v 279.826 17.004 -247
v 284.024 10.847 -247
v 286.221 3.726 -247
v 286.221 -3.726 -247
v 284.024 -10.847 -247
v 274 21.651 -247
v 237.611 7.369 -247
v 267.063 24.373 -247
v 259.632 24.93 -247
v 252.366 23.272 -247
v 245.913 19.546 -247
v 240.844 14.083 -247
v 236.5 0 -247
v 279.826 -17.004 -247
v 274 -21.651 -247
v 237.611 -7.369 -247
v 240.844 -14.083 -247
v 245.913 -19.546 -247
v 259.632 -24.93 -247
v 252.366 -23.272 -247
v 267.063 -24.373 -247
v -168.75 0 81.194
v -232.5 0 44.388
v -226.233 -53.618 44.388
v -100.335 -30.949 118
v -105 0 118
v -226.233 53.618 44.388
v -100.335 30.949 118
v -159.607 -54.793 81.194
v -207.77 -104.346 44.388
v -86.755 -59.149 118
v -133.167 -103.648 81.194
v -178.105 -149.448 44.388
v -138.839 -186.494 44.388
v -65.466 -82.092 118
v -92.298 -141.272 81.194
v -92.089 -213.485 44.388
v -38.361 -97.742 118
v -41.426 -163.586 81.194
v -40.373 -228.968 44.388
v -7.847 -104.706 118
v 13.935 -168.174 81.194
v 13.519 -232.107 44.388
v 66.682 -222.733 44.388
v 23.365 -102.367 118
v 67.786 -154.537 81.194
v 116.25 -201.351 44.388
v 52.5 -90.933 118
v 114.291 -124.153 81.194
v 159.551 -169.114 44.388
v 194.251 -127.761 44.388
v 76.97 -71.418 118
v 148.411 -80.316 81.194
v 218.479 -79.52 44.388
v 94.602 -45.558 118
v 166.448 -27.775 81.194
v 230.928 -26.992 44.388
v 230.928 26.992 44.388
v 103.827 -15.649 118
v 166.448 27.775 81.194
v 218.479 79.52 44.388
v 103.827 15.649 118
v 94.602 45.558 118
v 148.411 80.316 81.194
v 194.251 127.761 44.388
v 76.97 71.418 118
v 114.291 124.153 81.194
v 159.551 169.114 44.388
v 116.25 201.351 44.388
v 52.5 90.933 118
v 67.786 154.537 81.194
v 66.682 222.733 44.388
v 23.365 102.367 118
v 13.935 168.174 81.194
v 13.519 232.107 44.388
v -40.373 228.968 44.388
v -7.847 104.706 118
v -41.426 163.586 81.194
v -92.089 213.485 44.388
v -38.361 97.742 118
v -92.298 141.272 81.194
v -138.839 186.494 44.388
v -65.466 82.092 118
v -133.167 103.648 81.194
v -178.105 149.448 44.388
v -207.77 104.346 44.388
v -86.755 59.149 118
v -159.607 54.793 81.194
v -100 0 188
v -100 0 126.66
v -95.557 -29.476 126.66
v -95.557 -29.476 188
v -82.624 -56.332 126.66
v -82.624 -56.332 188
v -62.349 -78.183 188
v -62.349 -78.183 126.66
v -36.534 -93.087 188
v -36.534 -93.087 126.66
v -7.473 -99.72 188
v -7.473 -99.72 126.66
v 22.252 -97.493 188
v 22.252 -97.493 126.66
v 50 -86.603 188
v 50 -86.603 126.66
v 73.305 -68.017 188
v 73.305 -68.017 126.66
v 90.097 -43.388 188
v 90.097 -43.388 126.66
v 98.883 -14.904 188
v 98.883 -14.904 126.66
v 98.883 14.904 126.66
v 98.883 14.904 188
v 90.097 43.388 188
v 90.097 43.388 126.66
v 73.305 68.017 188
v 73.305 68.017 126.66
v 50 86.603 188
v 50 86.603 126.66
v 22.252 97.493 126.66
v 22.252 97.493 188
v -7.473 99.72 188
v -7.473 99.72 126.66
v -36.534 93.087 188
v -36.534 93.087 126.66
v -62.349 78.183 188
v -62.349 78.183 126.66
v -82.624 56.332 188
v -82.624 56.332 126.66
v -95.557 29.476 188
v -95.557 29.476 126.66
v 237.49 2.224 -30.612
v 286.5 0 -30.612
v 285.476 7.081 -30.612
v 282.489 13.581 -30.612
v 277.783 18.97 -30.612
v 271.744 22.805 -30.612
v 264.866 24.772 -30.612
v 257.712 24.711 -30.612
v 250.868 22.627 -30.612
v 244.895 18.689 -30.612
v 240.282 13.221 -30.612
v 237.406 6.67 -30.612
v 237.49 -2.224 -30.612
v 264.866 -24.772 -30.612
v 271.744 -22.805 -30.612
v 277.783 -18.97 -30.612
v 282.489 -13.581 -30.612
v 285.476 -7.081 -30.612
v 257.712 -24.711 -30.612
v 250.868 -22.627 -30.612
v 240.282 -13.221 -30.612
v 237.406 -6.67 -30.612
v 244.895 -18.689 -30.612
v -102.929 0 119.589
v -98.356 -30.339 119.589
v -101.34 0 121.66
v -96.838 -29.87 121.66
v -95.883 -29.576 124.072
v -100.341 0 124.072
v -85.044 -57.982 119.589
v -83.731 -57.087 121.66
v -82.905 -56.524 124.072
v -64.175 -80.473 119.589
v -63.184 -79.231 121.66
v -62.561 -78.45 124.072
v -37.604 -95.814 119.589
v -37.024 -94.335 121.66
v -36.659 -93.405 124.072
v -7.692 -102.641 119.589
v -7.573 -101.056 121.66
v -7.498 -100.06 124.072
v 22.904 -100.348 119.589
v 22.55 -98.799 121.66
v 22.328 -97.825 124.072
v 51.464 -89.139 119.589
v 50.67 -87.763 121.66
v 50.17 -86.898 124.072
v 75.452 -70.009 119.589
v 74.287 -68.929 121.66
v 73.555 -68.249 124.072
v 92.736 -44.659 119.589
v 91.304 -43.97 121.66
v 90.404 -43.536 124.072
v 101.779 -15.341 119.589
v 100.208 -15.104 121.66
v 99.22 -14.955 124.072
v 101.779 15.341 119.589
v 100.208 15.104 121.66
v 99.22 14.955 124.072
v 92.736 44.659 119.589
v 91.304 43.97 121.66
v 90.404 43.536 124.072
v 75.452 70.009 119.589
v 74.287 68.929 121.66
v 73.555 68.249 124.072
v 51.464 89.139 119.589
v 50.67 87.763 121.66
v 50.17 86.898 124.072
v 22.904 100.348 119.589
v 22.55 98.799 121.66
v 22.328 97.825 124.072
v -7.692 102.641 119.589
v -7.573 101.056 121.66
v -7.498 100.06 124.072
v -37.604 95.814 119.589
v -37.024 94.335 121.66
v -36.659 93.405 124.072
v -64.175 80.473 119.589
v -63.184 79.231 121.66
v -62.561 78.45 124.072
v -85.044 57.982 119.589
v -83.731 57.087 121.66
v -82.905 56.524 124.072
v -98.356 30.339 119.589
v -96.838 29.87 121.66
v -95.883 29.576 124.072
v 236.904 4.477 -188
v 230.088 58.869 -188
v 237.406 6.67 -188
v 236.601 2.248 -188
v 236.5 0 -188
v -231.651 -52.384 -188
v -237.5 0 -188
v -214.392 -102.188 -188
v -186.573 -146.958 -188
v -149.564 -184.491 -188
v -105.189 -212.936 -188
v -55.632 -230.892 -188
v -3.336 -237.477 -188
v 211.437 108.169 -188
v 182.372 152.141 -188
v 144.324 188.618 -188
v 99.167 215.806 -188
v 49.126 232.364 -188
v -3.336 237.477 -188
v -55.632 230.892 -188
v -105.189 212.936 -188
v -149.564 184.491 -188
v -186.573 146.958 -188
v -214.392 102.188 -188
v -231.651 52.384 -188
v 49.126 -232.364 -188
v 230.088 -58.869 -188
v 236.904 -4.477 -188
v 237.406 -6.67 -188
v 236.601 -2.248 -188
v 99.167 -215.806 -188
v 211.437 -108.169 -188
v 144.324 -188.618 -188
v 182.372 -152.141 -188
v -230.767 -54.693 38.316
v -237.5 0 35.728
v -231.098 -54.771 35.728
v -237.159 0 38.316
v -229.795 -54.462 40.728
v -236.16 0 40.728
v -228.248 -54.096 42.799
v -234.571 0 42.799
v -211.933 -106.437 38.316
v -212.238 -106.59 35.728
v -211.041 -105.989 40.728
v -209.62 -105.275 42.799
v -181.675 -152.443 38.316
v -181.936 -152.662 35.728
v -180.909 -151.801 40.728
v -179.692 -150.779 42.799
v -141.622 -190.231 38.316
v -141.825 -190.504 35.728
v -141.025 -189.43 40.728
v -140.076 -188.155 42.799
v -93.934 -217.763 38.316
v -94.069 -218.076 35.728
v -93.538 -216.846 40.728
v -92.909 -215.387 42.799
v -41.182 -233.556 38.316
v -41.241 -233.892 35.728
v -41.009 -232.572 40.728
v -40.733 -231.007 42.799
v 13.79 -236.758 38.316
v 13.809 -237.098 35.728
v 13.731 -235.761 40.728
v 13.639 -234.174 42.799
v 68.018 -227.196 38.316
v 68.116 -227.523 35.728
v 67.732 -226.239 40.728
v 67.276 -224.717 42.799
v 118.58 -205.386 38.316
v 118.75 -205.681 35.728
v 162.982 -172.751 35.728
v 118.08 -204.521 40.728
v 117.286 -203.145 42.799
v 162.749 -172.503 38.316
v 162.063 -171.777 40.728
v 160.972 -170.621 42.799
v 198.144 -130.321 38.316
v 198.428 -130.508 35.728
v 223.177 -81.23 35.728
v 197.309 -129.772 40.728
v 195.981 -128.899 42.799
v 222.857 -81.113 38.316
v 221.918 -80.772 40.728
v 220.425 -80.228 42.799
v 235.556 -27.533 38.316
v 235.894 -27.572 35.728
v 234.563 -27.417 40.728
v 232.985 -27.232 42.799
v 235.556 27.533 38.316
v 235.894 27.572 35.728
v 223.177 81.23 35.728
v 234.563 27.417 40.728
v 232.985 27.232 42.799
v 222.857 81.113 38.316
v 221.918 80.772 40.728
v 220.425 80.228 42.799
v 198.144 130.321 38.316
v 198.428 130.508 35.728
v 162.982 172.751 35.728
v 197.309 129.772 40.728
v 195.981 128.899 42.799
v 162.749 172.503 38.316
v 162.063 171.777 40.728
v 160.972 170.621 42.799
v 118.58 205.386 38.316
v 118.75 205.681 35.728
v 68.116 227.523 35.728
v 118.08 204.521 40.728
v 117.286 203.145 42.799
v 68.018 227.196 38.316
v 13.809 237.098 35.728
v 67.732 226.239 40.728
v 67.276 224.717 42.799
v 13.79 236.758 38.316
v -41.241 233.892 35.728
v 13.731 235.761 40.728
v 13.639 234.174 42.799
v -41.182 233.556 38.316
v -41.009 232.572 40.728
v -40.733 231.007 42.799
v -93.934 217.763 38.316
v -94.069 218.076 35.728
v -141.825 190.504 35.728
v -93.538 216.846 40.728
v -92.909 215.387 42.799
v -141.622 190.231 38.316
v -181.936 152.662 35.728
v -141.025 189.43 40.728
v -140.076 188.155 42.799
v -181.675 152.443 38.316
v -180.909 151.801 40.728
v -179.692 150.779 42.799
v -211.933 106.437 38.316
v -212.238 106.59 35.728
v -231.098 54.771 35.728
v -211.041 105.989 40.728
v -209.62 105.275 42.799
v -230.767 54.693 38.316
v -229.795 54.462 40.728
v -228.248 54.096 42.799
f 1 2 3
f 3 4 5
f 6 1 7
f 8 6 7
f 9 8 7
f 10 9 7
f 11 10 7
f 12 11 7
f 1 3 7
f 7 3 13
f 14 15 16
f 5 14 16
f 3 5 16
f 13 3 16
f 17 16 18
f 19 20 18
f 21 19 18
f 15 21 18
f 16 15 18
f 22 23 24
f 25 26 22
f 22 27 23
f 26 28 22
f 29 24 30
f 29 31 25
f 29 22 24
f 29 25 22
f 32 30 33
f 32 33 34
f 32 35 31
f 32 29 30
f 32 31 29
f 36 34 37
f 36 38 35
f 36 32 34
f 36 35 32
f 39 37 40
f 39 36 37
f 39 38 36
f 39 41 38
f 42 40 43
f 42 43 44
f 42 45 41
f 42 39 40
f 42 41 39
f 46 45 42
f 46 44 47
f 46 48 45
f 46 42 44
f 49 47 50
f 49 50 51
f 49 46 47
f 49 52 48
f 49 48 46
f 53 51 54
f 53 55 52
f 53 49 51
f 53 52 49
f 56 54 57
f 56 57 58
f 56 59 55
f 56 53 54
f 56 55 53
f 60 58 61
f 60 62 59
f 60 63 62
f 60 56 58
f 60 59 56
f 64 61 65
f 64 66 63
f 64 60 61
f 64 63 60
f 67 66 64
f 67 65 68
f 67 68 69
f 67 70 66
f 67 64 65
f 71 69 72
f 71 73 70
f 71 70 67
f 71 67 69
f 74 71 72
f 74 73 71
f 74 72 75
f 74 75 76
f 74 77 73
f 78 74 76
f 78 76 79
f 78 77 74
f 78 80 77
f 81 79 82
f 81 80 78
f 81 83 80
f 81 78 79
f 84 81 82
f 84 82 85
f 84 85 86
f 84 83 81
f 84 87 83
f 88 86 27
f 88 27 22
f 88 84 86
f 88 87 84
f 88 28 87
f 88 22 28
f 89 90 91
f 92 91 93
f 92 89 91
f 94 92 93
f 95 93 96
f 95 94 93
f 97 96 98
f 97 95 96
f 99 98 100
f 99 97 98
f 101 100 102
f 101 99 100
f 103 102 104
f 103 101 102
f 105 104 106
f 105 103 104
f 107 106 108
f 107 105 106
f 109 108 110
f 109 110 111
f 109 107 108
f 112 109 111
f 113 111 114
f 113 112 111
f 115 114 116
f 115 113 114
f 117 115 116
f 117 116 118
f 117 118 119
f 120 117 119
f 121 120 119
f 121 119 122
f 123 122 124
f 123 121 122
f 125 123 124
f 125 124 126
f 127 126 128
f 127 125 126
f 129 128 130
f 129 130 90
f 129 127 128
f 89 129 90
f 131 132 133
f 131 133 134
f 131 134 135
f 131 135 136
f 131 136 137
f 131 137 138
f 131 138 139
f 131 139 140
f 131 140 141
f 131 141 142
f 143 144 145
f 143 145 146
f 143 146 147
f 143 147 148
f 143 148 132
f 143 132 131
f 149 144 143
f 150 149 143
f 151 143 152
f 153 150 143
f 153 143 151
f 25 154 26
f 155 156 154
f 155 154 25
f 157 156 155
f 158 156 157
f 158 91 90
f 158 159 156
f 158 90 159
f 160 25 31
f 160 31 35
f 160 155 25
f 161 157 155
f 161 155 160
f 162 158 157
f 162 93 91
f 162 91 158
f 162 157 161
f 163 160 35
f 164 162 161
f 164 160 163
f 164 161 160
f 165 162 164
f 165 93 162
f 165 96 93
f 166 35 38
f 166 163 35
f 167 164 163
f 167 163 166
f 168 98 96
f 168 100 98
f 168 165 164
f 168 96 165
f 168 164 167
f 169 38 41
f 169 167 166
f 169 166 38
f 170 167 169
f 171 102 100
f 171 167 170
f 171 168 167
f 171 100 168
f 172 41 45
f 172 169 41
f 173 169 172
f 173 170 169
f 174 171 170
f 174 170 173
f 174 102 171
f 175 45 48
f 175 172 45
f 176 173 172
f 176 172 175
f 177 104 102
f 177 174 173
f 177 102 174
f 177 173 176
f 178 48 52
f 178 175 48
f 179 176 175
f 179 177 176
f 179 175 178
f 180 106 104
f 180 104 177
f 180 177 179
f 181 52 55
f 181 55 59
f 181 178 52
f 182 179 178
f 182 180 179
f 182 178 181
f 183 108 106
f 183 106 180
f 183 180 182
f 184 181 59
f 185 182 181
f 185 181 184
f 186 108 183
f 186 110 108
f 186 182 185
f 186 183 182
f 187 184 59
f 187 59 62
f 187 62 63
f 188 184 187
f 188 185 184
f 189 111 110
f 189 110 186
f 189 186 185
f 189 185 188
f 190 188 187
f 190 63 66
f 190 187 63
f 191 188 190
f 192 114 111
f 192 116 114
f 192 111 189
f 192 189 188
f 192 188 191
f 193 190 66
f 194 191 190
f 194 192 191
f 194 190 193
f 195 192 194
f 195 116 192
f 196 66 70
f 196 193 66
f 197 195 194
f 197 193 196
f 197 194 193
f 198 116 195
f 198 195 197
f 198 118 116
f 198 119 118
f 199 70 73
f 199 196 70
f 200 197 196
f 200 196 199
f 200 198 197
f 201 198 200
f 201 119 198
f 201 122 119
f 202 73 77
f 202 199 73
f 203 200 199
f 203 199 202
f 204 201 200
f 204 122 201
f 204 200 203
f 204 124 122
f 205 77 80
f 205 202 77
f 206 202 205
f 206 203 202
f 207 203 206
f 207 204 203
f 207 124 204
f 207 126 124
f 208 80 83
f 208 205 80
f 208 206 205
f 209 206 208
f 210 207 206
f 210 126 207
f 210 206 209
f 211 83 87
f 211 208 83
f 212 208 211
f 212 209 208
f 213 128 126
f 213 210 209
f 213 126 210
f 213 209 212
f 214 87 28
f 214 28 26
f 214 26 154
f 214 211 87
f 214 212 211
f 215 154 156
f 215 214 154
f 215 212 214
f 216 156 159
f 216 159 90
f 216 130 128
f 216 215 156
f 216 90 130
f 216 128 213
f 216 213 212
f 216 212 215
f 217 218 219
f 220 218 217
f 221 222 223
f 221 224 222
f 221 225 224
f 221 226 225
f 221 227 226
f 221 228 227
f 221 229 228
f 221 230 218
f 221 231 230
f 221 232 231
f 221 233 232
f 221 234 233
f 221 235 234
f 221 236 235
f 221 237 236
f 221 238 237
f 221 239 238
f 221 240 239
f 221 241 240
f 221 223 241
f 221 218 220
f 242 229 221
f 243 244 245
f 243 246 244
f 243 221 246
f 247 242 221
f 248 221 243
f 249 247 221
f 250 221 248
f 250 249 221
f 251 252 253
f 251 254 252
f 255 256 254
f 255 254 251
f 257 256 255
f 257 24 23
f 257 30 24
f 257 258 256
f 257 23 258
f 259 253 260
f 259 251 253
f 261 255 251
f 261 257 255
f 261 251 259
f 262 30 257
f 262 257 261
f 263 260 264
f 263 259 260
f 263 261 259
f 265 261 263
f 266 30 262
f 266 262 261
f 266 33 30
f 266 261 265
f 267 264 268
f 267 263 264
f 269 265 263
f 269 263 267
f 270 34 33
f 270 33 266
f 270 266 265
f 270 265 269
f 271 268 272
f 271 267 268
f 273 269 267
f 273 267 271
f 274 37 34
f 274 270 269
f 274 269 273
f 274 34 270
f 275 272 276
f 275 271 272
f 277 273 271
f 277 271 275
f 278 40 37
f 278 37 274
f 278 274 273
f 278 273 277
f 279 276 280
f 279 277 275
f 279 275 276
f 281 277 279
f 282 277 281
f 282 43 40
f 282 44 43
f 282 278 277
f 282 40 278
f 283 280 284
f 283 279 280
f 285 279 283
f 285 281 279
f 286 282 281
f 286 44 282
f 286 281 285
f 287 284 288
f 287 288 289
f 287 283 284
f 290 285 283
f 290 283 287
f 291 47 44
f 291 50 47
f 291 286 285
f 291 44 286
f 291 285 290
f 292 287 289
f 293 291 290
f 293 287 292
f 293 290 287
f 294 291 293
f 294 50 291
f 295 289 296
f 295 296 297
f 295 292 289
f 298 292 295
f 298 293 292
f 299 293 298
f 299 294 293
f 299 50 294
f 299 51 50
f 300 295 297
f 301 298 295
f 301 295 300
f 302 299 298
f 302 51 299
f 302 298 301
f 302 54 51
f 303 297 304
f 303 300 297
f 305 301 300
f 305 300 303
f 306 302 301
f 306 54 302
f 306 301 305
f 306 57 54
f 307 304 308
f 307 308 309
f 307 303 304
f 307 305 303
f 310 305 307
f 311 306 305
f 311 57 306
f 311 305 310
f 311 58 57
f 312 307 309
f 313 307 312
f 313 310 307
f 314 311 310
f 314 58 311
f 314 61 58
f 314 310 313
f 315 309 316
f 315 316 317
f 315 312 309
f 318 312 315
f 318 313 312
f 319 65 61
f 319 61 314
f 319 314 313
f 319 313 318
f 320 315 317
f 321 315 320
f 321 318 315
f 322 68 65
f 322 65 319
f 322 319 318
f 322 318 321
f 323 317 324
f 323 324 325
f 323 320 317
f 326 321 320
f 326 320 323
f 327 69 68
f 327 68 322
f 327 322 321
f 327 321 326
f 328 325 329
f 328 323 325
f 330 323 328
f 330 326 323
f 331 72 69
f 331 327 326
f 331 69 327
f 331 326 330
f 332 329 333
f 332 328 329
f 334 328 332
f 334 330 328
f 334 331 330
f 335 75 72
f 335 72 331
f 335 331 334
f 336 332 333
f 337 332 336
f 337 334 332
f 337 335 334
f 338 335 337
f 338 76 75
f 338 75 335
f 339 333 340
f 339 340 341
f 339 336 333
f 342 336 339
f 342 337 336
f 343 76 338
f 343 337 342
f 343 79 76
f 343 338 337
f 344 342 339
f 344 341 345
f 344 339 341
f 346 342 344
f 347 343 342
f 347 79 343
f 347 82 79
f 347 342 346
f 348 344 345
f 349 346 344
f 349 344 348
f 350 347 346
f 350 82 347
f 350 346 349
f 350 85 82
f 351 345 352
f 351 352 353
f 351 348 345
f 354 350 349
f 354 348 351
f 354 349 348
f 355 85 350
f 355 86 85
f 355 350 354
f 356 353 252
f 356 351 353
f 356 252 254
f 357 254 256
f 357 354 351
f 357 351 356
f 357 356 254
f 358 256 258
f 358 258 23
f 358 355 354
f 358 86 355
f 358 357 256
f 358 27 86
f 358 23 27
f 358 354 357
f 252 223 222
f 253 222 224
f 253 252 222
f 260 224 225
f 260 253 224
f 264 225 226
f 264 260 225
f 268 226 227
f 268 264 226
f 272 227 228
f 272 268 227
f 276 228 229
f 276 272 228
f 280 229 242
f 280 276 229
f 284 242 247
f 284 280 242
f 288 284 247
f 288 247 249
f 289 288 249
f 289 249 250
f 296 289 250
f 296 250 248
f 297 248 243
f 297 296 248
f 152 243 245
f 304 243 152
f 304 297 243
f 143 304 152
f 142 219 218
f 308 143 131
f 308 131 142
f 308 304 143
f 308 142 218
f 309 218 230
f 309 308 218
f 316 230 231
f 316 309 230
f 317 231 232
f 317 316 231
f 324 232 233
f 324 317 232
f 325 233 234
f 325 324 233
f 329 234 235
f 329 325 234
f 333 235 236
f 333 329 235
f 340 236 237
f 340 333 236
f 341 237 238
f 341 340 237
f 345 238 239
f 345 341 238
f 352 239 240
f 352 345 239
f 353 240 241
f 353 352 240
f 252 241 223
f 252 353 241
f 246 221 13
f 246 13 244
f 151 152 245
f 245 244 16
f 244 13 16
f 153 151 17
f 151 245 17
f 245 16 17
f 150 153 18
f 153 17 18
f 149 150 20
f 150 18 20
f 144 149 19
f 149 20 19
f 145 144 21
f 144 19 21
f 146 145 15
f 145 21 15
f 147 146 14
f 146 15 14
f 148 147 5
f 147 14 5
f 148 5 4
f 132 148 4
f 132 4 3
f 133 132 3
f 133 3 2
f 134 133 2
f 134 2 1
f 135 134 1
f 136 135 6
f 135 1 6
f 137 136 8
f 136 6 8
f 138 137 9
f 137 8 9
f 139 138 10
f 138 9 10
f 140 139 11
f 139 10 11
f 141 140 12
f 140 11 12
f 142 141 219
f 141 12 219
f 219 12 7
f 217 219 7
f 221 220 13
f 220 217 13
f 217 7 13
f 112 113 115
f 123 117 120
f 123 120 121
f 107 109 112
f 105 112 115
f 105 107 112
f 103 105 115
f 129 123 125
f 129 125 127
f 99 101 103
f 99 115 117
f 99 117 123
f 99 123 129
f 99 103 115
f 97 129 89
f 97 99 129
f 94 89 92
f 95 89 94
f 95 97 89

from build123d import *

# Parameters (mm, degrees)
SKETCH3_W = 25
SKETCH3_H = 216.387840678


with BuildPart() as part:
    # Sketch2 → Revolve1 (revolve)
    with BuildSketch(Plane(origin=(0, 0, 0), x_dir=(1, 0, 0), z_dir=(0, 1, 0))):
        with BuildLine():
            Line((-232.5, -44.387840678), (-105, -118))
            ThreePointArc((-105, -118), (-101.339745962, -121.660254038), (-100, -126.660254038))
            Line((-100, -126.660254038), (-100, -188))
            Line((-100, -188), (0, -188))
            Line((0, -188), (0, 188))
            Line((0, 188), (-237.5, 188))
            Line((-237.5, 188), (-237.5, -35.72758664))
            ThreePointArc((-237.5, -35.72758664), (-236.160254038, -40.72758664), (-232.5, -44.387840678))
        make_face()
    revolve(axis=Axis((0, 0, -581.773938456), (0, 0, 1)))


with BuildPart() as body_2:
    # Sketch3 → Revolve2 (revolve)
    with BuildSketch(Plane(origin=(0, 0, 0), x_dir=(1, 0, 0), z_dir=(0, 1, 0))):
        with Locations((249, 138.806079661)):
            Rectangle(SKETCH3_W, SKETCH3_H)
    revolve(axis=Axis((261.5, 0, -182.650020504), (0, 0, 1)))

    # Combine3: union part
    add(part.part)


solid = body_2.part
